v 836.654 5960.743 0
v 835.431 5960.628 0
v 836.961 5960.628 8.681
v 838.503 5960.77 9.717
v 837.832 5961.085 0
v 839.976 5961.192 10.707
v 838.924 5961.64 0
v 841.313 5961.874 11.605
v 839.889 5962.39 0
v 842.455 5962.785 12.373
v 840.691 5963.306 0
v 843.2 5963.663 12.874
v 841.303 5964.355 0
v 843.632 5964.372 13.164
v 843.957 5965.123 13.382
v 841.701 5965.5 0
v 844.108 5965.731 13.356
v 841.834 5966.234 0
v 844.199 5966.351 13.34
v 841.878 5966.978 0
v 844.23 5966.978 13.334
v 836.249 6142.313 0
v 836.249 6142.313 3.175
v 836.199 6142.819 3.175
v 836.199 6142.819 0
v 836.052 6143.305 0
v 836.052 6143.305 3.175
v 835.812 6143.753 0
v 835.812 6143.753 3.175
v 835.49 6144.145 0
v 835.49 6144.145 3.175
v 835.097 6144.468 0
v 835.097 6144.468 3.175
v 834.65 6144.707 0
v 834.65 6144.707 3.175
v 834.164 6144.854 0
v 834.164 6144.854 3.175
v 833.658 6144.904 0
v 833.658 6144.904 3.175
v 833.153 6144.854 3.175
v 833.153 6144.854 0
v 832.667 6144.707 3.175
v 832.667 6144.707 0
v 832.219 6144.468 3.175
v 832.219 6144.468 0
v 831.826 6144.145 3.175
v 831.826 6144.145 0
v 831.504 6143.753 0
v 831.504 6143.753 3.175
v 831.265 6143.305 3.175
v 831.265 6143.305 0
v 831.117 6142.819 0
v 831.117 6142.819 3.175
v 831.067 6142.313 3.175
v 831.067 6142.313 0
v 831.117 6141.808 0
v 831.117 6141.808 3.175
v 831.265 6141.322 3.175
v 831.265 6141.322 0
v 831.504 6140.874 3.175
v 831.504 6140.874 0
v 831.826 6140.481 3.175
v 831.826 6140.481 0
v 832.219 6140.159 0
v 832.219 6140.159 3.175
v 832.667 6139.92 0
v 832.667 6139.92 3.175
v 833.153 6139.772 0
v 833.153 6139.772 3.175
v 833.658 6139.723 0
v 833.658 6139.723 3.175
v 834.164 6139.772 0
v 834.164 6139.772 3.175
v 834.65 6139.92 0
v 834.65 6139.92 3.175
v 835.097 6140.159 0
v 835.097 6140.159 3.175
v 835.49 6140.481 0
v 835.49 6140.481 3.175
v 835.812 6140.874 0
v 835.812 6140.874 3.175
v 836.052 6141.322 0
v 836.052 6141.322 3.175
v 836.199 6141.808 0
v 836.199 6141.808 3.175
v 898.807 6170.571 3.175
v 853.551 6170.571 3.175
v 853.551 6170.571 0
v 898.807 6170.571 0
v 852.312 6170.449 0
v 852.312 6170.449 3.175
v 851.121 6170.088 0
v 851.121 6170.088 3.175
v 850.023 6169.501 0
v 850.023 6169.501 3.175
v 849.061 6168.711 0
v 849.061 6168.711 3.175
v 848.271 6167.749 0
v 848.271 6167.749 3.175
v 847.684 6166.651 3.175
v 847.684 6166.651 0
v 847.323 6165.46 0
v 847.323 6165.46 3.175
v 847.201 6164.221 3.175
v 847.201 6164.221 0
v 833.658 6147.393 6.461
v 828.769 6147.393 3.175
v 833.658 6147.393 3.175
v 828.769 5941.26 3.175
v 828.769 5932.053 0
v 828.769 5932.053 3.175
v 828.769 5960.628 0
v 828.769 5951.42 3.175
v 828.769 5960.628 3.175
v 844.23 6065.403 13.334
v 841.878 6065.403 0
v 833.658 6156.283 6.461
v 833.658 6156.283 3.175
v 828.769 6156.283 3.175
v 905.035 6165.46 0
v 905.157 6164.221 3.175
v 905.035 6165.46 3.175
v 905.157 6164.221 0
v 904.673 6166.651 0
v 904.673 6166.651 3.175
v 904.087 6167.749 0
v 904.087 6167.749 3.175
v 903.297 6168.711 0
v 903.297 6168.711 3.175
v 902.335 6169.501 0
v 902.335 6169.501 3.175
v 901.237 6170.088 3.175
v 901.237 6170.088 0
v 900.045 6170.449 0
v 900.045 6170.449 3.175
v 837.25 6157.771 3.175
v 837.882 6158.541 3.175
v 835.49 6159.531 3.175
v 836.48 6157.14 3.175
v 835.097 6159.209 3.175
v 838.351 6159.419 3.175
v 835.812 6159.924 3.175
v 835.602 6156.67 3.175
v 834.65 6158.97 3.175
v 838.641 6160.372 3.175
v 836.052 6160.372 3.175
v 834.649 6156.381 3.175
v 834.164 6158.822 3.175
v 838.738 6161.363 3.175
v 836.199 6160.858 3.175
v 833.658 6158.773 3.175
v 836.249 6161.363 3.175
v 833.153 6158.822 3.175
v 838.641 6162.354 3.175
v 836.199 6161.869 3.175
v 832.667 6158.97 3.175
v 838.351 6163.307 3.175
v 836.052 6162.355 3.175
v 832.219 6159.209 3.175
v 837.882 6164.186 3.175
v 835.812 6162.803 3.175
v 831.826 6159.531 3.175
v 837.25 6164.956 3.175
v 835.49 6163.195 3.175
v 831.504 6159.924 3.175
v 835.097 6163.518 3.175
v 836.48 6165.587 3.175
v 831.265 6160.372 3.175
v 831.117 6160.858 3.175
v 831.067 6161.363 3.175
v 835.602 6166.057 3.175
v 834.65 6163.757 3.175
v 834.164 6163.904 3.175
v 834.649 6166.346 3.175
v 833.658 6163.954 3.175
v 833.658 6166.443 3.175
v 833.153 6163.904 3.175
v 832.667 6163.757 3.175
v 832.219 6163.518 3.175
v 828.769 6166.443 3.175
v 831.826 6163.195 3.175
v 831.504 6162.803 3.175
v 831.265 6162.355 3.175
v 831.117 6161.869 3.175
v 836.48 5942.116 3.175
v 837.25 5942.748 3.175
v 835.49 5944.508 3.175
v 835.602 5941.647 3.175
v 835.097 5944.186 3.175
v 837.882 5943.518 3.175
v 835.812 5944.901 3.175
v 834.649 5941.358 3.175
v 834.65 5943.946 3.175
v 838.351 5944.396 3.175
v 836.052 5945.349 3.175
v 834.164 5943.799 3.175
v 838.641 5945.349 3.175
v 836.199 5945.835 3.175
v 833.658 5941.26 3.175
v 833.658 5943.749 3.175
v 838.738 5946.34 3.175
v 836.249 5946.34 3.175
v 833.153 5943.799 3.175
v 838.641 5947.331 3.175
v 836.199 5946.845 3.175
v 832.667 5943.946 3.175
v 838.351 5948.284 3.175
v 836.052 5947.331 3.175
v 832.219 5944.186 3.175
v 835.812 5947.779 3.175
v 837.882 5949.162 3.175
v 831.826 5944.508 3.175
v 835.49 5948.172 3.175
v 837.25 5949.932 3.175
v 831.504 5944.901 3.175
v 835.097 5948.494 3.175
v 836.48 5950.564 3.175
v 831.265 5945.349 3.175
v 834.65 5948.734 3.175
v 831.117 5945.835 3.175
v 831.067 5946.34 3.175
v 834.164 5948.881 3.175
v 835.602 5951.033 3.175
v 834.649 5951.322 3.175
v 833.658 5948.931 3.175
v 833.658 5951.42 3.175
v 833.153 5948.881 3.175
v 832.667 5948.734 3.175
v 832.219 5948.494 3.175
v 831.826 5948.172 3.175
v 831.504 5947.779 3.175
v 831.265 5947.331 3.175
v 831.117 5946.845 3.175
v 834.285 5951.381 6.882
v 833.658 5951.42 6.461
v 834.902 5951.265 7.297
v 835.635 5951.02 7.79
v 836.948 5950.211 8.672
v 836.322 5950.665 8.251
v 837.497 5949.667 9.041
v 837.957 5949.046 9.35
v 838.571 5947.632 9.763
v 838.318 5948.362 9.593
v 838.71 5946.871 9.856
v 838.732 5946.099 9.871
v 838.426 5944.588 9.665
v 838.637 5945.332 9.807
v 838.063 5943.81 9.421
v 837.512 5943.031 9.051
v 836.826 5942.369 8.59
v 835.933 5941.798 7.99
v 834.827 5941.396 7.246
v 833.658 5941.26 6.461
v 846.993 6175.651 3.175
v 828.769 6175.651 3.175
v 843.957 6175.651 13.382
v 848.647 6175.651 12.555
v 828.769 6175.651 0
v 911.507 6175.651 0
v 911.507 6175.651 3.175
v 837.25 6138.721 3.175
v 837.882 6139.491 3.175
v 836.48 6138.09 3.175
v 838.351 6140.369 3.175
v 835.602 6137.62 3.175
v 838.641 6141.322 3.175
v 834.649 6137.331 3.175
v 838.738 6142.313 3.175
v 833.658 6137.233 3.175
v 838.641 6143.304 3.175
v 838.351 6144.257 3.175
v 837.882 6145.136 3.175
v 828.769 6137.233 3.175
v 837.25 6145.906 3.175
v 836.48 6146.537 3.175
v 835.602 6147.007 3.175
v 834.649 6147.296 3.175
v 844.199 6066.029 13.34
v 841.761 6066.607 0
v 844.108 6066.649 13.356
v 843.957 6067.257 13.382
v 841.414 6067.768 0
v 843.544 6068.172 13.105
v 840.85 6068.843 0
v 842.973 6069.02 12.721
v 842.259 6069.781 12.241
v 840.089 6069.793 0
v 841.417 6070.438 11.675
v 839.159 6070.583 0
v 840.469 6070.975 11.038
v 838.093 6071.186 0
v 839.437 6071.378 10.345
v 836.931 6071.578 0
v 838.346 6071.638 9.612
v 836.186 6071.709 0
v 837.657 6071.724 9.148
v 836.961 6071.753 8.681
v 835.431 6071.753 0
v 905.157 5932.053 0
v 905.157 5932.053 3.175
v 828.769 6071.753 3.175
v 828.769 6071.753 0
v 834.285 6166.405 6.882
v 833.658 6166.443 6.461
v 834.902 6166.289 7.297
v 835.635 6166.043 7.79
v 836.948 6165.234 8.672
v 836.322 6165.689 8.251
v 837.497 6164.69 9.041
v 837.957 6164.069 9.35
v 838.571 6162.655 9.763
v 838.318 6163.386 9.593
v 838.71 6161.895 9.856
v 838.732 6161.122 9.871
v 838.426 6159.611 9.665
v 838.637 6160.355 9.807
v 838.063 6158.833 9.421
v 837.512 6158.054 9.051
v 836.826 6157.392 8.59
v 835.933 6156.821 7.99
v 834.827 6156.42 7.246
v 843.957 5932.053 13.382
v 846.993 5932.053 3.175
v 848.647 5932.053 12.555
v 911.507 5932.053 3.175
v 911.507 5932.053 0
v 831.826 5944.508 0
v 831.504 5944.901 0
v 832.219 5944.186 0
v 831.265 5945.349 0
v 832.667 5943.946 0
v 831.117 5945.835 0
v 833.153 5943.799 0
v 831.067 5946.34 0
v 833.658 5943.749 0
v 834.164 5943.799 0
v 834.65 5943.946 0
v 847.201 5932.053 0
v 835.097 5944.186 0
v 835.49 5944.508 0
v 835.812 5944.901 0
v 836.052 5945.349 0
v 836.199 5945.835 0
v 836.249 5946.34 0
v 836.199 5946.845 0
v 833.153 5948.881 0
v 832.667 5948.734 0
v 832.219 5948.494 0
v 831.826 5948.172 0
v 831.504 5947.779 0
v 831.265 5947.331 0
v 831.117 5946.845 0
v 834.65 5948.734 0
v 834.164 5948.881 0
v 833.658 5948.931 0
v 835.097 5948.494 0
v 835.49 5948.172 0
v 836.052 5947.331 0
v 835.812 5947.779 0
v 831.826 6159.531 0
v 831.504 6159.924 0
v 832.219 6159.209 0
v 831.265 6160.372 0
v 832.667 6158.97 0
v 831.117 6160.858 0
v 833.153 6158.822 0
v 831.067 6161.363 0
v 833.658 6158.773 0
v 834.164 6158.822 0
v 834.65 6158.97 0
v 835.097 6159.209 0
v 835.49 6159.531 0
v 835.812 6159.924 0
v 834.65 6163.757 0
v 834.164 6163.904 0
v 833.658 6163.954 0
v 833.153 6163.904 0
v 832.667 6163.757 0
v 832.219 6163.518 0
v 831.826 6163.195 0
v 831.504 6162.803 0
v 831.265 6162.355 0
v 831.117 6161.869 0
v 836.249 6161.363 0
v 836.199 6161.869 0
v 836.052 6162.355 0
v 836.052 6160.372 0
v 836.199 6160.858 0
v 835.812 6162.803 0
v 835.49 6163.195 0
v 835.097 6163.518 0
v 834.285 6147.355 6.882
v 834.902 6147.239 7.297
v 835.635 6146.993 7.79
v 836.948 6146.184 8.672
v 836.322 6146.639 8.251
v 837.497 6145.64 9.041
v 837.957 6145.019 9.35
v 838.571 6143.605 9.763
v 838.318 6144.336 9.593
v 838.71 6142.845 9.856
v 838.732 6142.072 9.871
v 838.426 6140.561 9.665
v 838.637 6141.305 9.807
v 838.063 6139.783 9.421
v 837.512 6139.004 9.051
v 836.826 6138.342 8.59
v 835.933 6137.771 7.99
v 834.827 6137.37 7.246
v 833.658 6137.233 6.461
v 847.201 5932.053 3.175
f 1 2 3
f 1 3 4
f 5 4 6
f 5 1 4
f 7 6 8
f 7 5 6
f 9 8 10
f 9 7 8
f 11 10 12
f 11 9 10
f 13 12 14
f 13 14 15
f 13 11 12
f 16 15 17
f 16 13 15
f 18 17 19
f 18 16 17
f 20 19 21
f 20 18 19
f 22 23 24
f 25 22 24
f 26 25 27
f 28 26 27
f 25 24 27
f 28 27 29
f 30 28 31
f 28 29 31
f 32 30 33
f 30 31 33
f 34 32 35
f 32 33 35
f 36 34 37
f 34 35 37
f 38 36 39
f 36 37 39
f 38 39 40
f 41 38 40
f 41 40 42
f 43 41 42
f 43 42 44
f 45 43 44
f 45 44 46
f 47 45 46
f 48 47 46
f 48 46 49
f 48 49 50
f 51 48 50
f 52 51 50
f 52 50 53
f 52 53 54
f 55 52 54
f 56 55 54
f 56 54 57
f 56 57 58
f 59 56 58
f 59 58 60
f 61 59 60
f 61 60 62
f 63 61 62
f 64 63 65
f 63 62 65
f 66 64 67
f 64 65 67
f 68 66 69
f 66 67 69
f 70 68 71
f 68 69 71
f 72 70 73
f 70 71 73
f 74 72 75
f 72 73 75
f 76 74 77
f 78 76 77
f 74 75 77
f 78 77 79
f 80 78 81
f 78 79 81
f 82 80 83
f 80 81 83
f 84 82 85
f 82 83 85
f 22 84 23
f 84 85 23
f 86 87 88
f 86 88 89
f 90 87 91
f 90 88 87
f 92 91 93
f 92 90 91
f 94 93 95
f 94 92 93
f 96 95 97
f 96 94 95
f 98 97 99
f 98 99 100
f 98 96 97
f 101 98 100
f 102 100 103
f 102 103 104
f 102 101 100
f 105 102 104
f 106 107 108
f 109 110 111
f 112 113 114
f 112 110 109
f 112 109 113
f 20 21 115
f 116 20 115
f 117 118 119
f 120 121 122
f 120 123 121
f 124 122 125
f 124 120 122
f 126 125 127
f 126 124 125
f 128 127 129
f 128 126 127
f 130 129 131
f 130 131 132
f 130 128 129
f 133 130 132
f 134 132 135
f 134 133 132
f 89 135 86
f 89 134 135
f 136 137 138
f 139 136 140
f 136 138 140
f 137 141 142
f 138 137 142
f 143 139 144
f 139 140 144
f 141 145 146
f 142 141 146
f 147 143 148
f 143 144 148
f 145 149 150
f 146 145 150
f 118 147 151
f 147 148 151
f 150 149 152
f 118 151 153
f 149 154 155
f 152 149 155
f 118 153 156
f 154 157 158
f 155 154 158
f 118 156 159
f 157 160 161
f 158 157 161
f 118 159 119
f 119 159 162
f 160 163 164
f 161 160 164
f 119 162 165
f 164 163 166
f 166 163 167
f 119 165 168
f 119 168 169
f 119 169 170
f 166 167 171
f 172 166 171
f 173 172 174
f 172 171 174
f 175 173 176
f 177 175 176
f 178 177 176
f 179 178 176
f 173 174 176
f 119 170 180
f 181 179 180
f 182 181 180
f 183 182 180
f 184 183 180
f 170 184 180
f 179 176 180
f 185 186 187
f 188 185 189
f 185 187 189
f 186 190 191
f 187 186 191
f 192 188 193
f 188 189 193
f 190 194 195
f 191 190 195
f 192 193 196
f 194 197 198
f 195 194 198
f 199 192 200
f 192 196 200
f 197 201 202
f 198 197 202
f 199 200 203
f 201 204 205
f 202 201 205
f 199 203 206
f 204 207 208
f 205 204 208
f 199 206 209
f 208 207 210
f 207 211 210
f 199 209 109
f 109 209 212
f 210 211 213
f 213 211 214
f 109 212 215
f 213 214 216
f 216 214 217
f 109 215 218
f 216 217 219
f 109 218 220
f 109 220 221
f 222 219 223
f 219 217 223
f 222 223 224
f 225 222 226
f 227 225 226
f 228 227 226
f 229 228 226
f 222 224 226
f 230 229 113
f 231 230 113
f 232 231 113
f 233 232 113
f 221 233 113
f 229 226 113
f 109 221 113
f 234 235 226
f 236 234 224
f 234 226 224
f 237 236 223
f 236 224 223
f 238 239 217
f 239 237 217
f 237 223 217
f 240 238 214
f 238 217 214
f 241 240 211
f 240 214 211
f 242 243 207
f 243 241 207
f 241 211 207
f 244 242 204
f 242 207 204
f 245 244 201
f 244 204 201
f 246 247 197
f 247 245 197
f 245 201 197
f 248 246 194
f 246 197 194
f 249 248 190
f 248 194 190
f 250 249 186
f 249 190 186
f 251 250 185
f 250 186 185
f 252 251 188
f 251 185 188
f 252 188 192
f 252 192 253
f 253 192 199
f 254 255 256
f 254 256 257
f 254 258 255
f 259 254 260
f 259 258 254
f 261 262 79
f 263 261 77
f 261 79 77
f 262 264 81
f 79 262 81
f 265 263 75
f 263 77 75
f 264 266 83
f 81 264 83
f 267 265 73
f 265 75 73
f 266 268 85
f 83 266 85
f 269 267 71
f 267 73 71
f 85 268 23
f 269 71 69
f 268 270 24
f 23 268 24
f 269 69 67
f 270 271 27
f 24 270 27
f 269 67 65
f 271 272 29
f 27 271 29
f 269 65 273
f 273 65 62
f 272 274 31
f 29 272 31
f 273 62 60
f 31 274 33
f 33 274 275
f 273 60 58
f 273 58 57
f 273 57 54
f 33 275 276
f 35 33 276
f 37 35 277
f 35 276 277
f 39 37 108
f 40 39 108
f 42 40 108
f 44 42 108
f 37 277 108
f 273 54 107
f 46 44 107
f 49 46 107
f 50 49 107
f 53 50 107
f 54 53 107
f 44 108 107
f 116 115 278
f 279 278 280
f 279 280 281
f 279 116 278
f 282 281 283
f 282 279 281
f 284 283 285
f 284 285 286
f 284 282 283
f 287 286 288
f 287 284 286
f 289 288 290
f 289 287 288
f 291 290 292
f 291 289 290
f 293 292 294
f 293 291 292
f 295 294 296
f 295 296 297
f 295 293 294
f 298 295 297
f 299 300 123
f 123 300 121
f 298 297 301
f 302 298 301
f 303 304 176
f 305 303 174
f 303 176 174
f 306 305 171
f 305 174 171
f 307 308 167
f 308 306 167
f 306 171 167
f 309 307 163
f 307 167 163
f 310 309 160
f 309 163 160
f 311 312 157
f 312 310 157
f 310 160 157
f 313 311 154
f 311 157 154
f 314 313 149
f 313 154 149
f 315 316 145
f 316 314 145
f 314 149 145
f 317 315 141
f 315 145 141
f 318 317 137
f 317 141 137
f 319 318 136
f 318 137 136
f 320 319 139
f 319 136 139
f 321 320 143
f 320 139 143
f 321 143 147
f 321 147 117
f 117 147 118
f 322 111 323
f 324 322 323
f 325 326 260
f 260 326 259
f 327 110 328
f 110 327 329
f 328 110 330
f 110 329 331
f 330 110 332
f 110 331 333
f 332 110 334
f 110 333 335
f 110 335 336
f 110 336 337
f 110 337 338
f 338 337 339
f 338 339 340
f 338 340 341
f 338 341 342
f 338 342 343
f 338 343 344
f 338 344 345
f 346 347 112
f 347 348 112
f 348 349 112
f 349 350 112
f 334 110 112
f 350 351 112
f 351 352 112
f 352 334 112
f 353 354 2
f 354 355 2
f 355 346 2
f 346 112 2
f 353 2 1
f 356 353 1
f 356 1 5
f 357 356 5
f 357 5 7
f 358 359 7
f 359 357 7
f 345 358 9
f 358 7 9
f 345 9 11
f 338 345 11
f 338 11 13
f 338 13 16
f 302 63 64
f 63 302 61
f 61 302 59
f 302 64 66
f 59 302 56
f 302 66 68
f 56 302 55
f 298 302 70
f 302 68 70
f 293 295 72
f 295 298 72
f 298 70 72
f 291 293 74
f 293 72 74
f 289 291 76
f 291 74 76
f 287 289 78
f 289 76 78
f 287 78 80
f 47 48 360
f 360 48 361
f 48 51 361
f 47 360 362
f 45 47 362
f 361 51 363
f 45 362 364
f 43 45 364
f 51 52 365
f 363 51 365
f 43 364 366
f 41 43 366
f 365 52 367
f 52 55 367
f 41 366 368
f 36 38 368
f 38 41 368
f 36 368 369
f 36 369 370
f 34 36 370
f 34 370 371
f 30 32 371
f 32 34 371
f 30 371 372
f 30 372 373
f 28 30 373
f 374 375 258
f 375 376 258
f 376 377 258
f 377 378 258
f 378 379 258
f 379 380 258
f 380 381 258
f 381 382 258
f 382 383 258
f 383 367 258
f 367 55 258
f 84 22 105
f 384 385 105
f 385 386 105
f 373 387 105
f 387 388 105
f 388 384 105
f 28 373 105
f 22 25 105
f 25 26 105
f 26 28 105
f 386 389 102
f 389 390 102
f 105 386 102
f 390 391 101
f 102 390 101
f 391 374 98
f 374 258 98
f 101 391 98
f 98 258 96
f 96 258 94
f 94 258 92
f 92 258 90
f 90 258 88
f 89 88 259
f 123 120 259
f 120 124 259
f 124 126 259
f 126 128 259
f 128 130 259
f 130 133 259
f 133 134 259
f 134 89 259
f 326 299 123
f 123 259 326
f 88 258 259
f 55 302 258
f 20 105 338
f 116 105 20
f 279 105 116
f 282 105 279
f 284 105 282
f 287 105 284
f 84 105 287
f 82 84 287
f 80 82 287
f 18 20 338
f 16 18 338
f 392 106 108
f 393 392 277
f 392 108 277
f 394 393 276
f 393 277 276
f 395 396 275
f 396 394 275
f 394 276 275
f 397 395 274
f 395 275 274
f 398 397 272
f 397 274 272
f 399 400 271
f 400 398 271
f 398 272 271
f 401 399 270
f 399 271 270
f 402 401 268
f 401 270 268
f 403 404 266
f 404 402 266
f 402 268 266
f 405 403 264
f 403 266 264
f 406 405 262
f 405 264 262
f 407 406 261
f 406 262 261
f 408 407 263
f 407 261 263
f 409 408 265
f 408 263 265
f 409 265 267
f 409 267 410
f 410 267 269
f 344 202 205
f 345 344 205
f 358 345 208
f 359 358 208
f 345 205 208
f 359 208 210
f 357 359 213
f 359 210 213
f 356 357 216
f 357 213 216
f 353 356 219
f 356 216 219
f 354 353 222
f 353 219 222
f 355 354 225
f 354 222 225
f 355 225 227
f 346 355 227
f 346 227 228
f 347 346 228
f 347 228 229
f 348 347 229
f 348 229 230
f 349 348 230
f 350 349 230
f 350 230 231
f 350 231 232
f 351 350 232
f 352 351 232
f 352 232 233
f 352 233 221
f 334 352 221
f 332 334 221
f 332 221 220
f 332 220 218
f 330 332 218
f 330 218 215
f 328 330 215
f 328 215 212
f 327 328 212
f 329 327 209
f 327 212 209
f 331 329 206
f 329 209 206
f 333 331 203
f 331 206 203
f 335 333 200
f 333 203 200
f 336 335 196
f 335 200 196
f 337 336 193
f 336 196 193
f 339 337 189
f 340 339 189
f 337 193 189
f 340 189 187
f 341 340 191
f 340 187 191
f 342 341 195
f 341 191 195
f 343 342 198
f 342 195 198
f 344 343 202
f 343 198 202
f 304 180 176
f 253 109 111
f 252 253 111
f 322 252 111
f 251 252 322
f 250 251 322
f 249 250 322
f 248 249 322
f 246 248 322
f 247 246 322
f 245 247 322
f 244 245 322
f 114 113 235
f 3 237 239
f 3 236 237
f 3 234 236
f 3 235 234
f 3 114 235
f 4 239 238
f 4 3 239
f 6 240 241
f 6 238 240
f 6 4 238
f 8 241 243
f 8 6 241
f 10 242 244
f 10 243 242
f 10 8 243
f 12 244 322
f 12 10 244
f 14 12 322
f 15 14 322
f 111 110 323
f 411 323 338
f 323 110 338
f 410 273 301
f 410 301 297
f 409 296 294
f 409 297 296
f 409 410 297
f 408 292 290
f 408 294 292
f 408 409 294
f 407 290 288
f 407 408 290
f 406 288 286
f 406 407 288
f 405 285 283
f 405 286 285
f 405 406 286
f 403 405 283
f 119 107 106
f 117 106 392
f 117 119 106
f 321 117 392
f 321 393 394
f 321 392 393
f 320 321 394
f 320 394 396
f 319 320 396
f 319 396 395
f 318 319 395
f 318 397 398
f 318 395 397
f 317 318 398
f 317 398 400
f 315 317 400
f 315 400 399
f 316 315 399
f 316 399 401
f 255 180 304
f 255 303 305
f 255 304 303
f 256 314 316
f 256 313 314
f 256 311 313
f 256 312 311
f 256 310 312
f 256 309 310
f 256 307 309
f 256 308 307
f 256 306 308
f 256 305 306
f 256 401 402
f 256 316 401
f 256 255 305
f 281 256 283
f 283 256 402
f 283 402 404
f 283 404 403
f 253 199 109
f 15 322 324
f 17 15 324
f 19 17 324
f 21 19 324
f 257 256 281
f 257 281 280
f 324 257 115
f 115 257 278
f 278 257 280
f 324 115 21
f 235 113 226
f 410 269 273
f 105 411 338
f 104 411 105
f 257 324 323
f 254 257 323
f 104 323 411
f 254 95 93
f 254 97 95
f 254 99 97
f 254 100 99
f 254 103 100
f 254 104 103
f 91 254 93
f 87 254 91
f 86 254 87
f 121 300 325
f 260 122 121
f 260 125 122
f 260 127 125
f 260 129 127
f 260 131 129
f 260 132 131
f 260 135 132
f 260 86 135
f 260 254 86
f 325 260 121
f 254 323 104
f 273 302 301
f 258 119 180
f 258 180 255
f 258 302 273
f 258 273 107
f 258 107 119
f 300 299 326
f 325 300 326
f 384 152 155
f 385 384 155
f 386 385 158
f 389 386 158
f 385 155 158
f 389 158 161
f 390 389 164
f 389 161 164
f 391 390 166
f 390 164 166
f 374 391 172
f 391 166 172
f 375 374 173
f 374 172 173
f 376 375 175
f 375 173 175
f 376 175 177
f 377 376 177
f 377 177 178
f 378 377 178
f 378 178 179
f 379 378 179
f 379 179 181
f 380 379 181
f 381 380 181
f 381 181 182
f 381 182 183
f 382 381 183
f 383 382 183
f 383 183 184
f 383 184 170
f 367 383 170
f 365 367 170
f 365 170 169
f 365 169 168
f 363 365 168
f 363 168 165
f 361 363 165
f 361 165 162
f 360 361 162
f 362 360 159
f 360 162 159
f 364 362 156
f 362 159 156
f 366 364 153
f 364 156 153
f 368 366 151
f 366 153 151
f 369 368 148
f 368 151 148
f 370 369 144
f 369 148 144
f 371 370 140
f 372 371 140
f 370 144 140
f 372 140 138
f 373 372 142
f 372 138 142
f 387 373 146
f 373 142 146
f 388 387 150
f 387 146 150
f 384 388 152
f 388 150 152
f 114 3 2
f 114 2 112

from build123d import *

# Parameters (mm, degrees)
SKETCH2_W                  = 82.738044028
SKETCH2_H                  = 243.598411898
BOSS_EXTRUDE1_DEPTH        = 3.175
BOSS_EXTRUDE2_DEPTH        = 243.598412
SKETCH3_W                  = 13.462
SKETCH3_H                  = 111.125
CUT_EXTRUDE1_DEPTH         = 16.816415828
CUT_EXTRUDE1_DEPTH_BACK    = 12.72988093
FILLET1_R                  = 6.35
SKETCH4_W                  = 57.955870979
SKETCH4_H                  = 238.518411898
CUT_EXTRUDE2_DEPTH         = 4.175
FILLET2_R                  = 6.35
F_6_0_204_DIAMETER_HOLE1_D = 5.1816
CUT_EXTRUDE3_DEPTH         = 11.207293294


with BuildPart() as part:
    # Sketch2 → Boss-Extrude1 (new body)
    with BuildSketch(Plane.XY):
        with Locations((870.137648104, 6053.851709568)):
            Rectangle(SKETCH2_W, SKETCH2_H)
    extrude(amount=BOSS_EXTRUDE1_DEPTH)

    # Sketch5 → Boss-Extrude2 (add, through all)
    with BuildSketch(Plane(origin=(0, 6175.650915517, 0), x_dir=(1, 0, 0), z_dir=(0, 1, 0))):
        Polygon((828.76862609, -3.175), (843.956978058, -13.382293294), (848.647124982, -12.555293847), (846.99312609, -3.175), align=None)
    extrude(amount=-BOSS_EXTRUDE2_DEPTH)

    # Sketch3 → Cut-Extrude1 (cut, two sides)
    with BuildSketch(Plane(origin=(1789.989771594, 0, -153.428812844), x_dir=(-0.984807753, 0, 0.173648178), z_dir=(-0.173648178, 0, -0.984807753))) as cut_extrude1_sk:
        with Locations((967.081003168, 6016.190003619)):
            Rectangle(SKETCH3_W, SKETCH3_H)
    extrude(amount=CUT_EXTRUDE1_DEPTH, mode=Mode.SUBTRACT)
    extrude(cut_extrude1_sk.sketch, amount=-CUT_EXTRUDE1_DEPTH_BACK, mode=Mode.SUBTRACT)

    # Fillet1
    fillet1_edges = [part.edges().sort_by_distance(p)[0] for p in [
        (843.054051922, 6071.752503619, 6.667107565),
        (843.054051922, 5960.627503619, 6.667107565),
    ]]
    fillet(fillet1_edges, radius=FILLET1_R)

    # Sketch4 → Cut-Extrude2 (cut, through all)
    with BuildSketch(Plane.XY.offset(3.175)):
        with Locations((876.178734629, 6051.311709568)):
            Rectangle(SKETCH4_W, SKETCH4_H)
    extrude(amount=-CUT_EXTRUDE2_DEPTH, mode=Mode.SUBTRACT)

    # Fillet2
    fillet2_edges = [part.edges().sort_by_distance(p)[0] for p in [
        (905.156670118, 6170.570915517, 1.5875),
        (847.200799139, 6170.570915517, 1.5875),
    ]]
    fillet(fillet2_edges, radius=FILLET2_R)

    # #6 (0.204) Diameter Hole1 (through all)
    with Locations(Plane(origin=(0, 0, 0), x_dir=(-1, 0, 0), z_dir=(0, 0, -1))):
        with Locations((-833.65812609, 6161.363415517), (-833.65812609, 6142.313415517), (-833.65812609, 5946.340003619)):
            Hole(F_6_0_204_DIAMETER_HOLE1_D / 2)

    # Sketch8 → Cut-Extrude3 (cut, through all)
    with BuildSketch(Plane.XY.offset(3.175)):
        with BuildLine():
            Line((833.65812609, 6156.283415517), (828.76862609, 6156.283415517))
            ThreePointArc((828.76862609, 6156.283415517), (823.68862609, 6161.363415517), (828.76862609, 6166.443415517))
            Line((828.76862609, 6166.443415517), (833.65812609, 6166.443415517))
            ThreePointArc((833.65812609, 6166.443415517), (838.73812609, 6161.363415517), (833.65812609, 6156.283415517))
        make_face()
        with BuildLine():
            Line((833.65812609, 6137.233415517), (828.76862609, 6137.233415517))
            ThreePointArc((828.76862609, 6137.233415517), (823.68862609, 6142.313415517), (828.76862609, 6147.393415517))
            Line((828.76862609, 6147.393415517), (833.65812609, 6147.393415517))
            ThreePointArc((833.65812609, 6147.393415517), (838.73812609, 6142.313415517), (833.65812609, 6137.233415517))
        make_face()
        with BuildLine():
            Line((833.65812609, 5941.260003619), (828.76862609, 5941.260003619))
            ThreePointArc((828.76862609, 5941.260003619), (823.68862609, 5946.340003619), (828.76862609, 5951.420003619))
            Line((828.76862609, 5951.420003619), (833.65812609, 5951.420003619))
            ThreePointArc((833.65812609, 5951.420003619), (838.73812609, 5946.340003619), (833.65812609, 5941.260003619))
        make_face()
    extrude(amount=CUT_EXTRUDE3_DEPTH, mode=Mode.SUBTRACT)


solid = part.part
